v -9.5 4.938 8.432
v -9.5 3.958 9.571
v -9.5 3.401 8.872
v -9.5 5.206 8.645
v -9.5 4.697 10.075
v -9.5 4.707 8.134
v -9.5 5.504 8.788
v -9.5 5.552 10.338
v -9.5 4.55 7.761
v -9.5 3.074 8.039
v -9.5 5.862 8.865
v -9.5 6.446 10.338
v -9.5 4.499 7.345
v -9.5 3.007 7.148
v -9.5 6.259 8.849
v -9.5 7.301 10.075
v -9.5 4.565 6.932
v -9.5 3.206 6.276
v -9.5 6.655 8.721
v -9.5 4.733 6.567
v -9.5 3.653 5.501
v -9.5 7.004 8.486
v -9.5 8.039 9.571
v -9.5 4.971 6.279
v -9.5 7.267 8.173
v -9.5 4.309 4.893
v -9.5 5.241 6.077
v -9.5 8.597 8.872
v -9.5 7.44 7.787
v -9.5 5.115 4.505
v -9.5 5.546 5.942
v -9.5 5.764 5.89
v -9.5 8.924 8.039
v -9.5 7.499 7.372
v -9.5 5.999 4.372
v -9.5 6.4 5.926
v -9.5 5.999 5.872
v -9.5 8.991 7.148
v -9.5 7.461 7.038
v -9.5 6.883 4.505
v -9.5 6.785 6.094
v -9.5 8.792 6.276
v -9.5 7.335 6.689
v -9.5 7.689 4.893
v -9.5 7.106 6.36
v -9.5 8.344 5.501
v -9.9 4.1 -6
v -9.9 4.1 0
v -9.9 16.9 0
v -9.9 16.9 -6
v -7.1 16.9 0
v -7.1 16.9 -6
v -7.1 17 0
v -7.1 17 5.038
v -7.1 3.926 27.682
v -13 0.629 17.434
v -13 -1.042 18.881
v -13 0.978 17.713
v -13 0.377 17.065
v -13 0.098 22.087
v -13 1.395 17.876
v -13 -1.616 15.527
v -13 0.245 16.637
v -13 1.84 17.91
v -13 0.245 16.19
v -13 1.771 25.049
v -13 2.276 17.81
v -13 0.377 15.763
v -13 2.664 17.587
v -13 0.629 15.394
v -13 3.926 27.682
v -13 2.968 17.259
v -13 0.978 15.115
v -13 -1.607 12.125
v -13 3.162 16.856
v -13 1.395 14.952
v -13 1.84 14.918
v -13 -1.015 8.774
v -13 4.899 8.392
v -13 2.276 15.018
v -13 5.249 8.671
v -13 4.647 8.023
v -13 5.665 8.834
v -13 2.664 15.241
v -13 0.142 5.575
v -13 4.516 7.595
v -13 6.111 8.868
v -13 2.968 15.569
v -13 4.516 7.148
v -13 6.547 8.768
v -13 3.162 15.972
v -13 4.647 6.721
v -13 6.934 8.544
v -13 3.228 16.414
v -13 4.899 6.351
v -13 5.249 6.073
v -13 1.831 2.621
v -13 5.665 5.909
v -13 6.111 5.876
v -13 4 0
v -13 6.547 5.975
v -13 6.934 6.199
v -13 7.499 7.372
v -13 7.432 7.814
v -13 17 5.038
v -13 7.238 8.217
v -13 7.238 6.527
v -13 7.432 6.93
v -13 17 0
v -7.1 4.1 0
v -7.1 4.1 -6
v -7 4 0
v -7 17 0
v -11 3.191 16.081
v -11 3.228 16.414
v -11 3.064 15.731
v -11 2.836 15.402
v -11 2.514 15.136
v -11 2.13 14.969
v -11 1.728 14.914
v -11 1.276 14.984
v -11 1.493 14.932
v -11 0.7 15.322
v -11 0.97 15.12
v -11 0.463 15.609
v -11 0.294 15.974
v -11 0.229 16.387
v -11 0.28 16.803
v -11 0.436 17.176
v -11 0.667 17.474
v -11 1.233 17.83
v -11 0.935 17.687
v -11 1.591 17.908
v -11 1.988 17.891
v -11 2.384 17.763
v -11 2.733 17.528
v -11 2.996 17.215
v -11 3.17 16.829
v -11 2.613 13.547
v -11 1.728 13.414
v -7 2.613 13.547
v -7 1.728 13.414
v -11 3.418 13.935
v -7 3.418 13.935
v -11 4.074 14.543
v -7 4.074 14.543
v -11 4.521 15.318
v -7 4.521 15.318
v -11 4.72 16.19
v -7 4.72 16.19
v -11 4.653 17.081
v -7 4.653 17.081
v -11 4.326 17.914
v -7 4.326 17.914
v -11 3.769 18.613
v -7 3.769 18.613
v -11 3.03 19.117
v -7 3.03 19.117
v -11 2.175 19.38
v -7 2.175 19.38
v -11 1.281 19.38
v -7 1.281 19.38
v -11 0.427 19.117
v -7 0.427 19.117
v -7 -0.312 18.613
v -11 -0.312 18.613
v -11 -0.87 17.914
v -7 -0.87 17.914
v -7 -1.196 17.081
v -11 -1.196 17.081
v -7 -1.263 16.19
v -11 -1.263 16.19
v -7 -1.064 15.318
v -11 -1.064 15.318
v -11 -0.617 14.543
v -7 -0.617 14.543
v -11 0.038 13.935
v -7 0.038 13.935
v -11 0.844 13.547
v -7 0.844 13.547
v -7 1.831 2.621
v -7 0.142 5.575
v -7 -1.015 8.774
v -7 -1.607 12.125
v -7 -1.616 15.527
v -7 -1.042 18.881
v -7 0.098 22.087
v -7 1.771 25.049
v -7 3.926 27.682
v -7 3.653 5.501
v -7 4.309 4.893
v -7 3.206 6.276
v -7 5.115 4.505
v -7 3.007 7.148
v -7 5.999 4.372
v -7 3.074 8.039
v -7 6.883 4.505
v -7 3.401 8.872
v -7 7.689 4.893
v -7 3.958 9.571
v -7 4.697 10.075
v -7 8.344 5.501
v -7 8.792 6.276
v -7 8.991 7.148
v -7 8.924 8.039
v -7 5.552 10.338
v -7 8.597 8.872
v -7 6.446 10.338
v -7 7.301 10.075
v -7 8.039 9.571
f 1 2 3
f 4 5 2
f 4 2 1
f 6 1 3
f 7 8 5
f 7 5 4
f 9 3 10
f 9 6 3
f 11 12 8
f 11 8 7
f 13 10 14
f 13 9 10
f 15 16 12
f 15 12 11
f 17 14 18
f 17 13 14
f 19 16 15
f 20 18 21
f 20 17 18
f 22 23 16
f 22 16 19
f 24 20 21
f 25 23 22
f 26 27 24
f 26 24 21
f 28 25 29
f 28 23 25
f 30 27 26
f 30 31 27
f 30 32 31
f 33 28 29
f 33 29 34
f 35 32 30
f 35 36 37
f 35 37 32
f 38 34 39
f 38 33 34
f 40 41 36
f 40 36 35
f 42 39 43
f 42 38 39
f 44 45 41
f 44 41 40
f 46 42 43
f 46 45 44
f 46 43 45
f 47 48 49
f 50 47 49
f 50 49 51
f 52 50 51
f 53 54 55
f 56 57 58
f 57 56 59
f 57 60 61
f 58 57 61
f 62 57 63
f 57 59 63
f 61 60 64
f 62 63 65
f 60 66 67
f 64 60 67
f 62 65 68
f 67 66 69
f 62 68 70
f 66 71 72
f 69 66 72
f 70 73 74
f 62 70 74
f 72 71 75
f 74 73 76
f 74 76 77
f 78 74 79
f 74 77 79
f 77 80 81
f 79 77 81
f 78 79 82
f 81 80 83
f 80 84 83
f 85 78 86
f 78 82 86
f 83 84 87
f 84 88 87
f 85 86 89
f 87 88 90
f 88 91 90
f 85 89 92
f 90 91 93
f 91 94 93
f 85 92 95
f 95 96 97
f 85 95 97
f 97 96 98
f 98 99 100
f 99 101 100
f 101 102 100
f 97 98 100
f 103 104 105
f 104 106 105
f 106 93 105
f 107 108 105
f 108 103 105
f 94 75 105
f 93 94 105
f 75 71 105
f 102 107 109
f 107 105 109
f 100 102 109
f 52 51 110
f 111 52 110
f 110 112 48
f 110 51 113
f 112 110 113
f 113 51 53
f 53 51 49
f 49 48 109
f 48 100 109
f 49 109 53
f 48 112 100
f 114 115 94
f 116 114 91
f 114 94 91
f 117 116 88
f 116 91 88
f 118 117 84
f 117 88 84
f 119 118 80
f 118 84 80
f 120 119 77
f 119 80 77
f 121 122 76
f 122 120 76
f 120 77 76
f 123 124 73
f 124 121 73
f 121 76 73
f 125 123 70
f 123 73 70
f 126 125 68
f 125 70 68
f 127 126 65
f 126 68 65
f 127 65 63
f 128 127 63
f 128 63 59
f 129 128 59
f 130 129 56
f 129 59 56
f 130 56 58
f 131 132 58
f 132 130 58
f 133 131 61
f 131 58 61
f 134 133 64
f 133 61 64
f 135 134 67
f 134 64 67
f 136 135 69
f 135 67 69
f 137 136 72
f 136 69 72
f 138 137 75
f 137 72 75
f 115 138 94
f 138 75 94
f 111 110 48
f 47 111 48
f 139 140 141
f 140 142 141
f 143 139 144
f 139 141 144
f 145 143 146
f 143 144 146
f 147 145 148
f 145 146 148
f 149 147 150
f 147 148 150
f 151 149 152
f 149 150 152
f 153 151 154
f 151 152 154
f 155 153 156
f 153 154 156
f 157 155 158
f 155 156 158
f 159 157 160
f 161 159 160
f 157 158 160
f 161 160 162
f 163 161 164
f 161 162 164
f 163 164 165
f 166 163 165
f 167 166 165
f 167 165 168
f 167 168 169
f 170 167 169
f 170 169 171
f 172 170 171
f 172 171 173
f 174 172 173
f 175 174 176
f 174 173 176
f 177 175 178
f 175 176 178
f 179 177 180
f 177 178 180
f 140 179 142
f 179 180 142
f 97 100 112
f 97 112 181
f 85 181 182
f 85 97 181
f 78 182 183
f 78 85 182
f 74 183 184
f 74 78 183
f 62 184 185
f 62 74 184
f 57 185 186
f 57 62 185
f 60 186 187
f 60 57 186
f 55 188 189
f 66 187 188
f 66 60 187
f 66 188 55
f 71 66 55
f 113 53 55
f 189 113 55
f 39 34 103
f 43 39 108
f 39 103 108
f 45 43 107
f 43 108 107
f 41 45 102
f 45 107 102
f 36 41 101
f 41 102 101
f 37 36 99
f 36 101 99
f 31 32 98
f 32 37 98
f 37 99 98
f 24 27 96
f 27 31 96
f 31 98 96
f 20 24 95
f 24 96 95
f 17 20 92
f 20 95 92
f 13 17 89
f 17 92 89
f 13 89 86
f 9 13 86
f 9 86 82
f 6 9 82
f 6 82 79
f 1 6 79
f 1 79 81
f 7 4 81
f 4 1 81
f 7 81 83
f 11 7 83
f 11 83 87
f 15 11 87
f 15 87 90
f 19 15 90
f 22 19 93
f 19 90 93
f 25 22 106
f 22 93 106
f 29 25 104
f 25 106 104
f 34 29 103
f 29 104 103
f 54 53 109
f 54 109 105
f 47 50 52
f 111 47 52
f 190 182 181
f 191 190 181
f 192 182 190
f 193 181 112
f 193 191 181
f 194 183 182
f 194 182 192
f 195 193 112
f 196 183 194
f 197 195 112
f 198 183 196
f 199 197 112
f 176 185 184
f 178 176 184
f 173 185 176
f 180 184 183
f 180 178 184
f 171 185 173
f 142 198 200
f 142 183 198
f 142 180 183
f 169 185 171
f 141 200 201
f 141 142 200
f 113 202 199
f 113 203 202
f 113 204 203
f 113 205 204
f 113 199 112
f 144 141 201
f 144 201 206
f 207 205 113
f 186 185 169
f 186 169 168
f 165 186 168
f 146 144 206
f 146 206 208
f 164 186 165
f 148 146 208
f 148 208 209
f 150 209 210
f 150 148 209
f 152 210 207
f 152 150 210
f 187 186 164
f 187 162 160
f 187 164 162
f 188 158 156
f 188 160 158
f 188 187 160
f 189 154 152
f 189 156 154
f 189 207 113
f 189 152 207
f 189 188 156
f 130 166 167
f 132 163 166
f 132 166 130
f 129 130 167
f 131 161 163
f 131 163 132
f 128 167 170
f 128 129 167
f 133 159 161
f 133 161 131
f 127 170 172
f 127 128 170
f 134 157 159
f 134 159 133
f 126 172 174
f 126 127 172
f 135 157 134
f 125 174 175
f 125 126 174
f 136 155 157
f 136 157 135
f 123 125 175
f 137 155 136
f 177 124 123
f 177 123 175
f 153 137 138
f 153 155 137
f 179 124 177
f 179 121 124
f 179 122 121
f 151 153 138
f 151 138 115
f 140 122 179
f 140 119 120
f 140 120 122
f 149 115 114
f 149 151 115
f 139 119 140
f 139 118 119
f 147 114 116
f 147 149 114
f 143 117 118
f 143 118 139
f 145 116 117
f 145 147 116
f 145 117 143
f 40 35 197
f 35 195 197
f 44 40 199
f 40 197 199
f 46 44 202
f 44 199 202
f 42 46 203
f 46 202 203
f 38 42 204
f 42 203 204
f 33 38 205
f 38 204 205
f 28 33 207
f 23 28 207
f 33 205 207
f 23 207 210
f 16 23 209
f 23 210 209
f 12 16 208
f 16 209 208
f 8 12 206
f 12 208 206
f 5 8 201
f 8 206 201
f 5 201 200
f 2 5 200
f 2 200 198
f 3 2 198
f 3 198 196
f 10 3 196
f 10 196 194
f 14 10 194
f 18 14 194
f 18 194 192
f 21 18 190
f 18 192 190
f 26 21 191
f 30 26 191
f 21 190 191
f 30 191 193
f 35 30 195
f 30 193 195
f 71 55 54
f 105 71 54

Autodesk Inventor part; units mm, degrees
sketch "Эскиз1" plane through (0, 0, 0) normal (0, 0, 1) x (1, 0, 0)
  line L0 (-10, 17) -> (-7, 17) projected
  line L1 (-10, 4) -> (-10, 17) projected
  line L2 (-7, 4) -> (-10, 4) projected
  line L3 (-7, 17) -> (-7, 4) projected
  line L4 (-9.9, 4.1) -> (-9.9, 16.9)
  line L5 (-9.9, 16.9) -> (-7.1, 16.9)
  line L6 (-7.1, 16.9) -> (-7.1, 4.1)
  line L7 (-7.1, 4.1) -> (-9.9, 4.1)
  point P0 (0, 0)
  dimension "d22" = 0.1
ref_plane "РабПлоскость1" through (-13, -24, -6) normal (0, 0, -1) x (0, 1, 0)
extrude "Выдавливание1" add sketch "Эскиз1" against normal up to surface (6 mm away) contours L4 L5 L6 L7
ref_plane "РабПлоскость2" through (-13, 2.5481, 2.5558) normal (1, 0, 0) x (0, 1, 0)
sketch "Эскиз3" plane through (-13, 2.5481, 2.5558) normal (1, 0, 0) x (0, 1, 0)
  line L0 (29.663, -39.7893) -> (-15.8657, 56.6115) projected
  line L1 (1.4519, -2.5558) -> (14.4519, -2.5558) projected
  circle A0 centre (3.4507, 4.8159) radius 1.5 projected
  circle A1 centre (-0.8198, 13.8581) radius 1.5 projected
  arc A2 (1.3781, 25.1262) -> (1.4519, -2.5558) centre (15.5518, 11.3229) ccw
  line L2 (31.6038, -38.8726) -> (-13.9249, 57.5281)
  point P0 (-2.5481, -2.5558)
  point P1 (-0.157, 23.3504)
  point P2 (12.0781, -2.5558)
ref_plane "РабПлоскость3" through (-7, 4, -6) normal (-1, 0, 0) x (0, 0, 1)
extrude "Выдавливание3" add sketch "Эскиз3" along normal up to surface (6 mm away)
ref_plane "РабПлоскость5" through (-7, 4.2958, -6) normal (1, 0, 0) x (0, 0, -1)
sketch "Эскиз5" plane through (-7, 4.2958, -6) normal (1, 0, 0) x (0, 0, -1)
  spline S0 degree 2 poles (-13.3717, 3.2031) (-15.9697, 3.2031) (-14.6707, 0.9531) (-13.3717, -1.2969) (-12.0726, 0.9531) (-10.7736, 3.2031) (-13.3717, 3.2031) knots 0 0 0 0.333333 0.333333 0.666667 0.666667 1 1 1 weights 1 0.5 1 0.5 1 0.5 1 projected
  circle A0 centre (-13.3717, 1.7031) radius 3
  circle A1 centre (-13.3717, 1.7031) radius 1.5 projected
  circle A2 centre (-13.3717, 1.7031) radius 1.5 projected
  point P0 (-6, -4.2958)
  point P1 (-23.7703, -3.2081)
  point P2 (-23.7703, -3.2081)
  dimension "d12" = 6
extrude "Выдавливание5" cut sketch "Эскиз5" against normal blind 2.5
ref_plane "РабПлоскость4" through (-7, 4.2958, -6) normal (1, 0, 0) x (0, 0, -1)
sketch "Эскиз6" plane through (-7, 4.2958, -6) normal (1, 0, 0) x (0, 0, -1)
  spline S0 degree 2 poles (-22.4139, -1.0675) (-25.012, -1.0675) (-23.713, -3.3175) (-22.4139, -5.5675) (-21.1149, -3.3175) (-19.8159, -1.0675) (-22.4139, -1.0675) knots 0 0 0 0.333333 0.333333 0.666667 0.666667 1 1 1 weights 1 0.5 1 0.5 1 0.5 1 projected
  circle A0 centre (-22.4139, -2.5675) radius 1.5 projected
  circle A1 centre (-22.4139, -2.5675) radius 3
  point P0 (-6, -4.2958)
  dimension "d16" = 6
extrude "Выдавливание6" cut sketch "Эскиз6" against normal blind 4
sketch "Эскиз7" plane through (-7.1, 4, -6) normal (1, 0, 0) x (0, 0, -1)
  line L0 (-6, 13) -> (0, 13) projected
  line L1 (-6, 13) -> (-33.682, -0.0738) projected
  line L2 (-33.682, -0.0738) -> (-11.0375, 13)
  line L3 (-6, 13) -> (0, 13) projected
  line L4 (-6, 13) -> (-11.0375, 13)
  point P0 (-6, -4)
  dimension "d19" = 30
ref_plane "РабПлоскость6" through (-13, -28.5514, -58.6393) normal (1, 0, 0) x (0, 1, 0)
extrude "Выдавливание7" add sketch "Эскиз7" against normal up to surface (5.9 mm away)
properties part number "ЛЦМК.30000.10.00.04  Переходник"
